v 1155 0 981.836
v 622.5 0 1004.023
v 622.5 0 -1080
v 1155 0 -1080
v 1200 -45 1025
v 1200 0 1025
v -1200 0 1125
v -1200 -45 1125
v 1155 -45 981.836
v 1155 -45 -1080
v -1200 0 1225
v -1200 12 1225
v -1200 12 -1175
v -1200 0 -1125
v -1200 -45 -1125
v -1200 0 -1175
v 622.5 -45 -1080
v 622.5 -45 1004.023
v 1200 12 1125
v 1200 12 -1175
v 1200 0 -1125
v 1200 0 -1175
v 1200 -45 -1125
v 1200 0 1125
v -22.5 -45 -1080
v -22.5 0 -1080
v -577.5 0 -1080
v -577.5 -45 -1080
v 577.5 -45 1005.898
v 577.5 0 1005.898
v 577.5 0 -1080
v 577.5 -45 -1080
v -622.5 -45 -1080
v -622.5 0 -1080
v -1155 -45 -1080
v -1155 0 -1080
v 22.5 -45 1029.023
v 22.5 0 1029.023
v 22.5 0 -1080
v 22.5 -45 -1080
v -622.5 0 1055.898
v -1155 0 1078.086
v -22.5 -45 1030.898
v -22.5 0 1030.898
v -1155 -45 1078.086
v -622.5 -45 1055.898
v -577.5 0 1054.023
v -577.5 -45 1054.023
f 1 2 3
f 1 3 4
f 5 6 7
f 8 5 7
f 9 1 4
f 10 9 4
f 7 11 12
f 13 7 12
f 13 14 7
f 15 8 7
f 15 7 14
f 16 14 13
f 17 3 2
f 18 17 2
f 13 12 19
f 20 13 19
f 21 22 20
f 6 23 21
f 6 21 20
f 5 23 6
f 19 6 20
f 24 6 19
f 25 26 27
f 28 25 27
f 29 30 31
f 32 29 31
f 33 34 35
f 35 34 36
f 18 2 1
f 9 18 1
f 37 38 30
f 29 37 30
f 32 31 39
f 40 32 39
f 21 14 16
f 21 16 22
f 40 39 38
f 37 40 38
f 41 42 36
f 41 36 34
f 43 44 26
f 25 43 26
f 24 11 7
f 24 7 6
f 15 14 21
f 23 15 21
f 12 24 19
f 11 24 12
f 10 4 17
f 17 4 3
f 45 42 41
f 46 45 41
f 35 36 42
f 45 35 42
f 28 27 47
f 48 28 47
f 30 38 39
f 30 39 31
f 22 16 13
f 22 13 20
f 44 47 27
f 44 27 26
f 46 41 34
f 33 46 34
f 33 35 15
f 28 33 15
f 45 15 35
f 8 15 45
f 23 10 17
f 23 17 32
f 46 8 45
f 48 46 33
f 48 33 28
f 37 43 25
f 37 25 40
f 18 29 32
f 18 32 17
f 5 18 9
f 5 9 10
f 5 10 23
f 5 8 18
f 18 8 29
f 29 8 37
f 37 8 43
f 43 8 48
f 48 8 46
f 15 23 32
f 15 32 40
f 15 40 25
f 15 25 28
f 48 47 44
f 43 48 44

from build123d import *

# Parameters (mm, degrees)
F1_DEPTH = 45
F0_W     = 2400
F0_H     = 50
F2_DEPTH = 12


with BuildPart() as f1:
    # F0 (on Front) → F1 (new body)
    with BuildSketch(Plane.XZ):
        Polygon((1155, 981.835954), (1200, 979.960954), (1200, 1025), (-1200, 1125), (-1200, 1079.960954), (-1155, 1078.085954), (-622.5, 1055.898454), (-577.5, 1054.023454), (-22.5, 1030.898454), (22.5, 1029.023454), (577.5, 1005.898454), (622.5, 1004.023454), align=None)
        Polygon((-1200, 1079.960954), (-1200, -1080), (-1155, -1080), (-1155, 1078.085954), align=None)
        Polygon((-622.5, 1055.898454), (-622.5, -1080), (-577.5, -1080), (-577.5, 1054.023454), align=None)
        Polygon((-22.5, -1080), (22.5, -1080), (22.5, 1029.023454), (-22.5, 1030.898454), align=None)
        Polygon((577.5, -1080), (622.5, -1080), (622.5, 1004.023454), (577.5, 1005.898454), align=None)
        Polygon((1155, -1080), (1200, -1080), (1200, 979.960954), (1155, 981.835954), align=None)
        Polygon((-1200, -1125), (1200, -1125), (1200, -1080), (1155, -1080), (622.5, -1080), (577.5, -1080), (22.5, -1080), (-22.5, -1080), (-577.5, -1080), (-622.5, -1080), (-1155, -1080), (-1200, -1080), align=None)
    extrude(amount=F1_DEPTH)

    # F0 (on Front) → F2 (join)
    with BuildSketch(Plane.XZ):
        Polygon((-1155, 1078.085954), (-1155, -1080), (-622.5, -1080), (-622.5, 1055.898454), align=None)
        Polygon((-577.5, 1054.023454), (-577.5, -1080), (-22.5, -1080), (-22.5, 1030.898454), align=None)
        Polygon((22.5, -1080), (577.5, -1080), (577.5, 1005.898454), (22.5, 1029.023454), align=None)
        Polygon((622.5, -1080), (1155, -1080), (1155, 981.835954), (622.5, 1004.023454), align=None)
        Polygon((-1200, 1125), (1200, 1025), (1200, 1125), (-1200, 1225), align=None)
        Polygon((1155, 981.835954), (1200, 979.960954), (1200, 1025), (-1200, 1125), (-1200, 1079.960954), (-1155, 1078.085954), (-622.5, 1055.898454), (-577.5, 1054.023454), (-22.5, 1030.898454), (22.5, 1029.023454), (577.5, 1005.898454), (622.5, 1004.023454), align=None)
        Polygon((-1200, 1079.960954), (-1200, -1080), (-1155, -1080), (-1155, 1078.085954), align=None)
        Polygon((-622.5, 1055.898454), (-622.5, -1080), (-577.5, -1080), (-577.5, 1054.023454), align=None)
        Polygon((-22.5, -1080), (22.5, -1080), (22.5, 1029.023454), (-22.5, 1030.898454), align=None)
        Polygon((577.5, -1080), (622.5, -1080), (622.5, 1004.023454), (577.5, 1005.898454), align=None)
        Polygon((1155, -1080), (1200, -1080), (1200, 979.960954), (1155, 981.835954), align=None)
        Polygon((-1200, -1125), (1200, -1125), (1200, -1080), (1155, -1080), (622.5, -1080), (577.5, -1080), (22.5, -1080), (-22.5, -1080), (-577.5, -1080), (-622.5, -1080), (-1155, -1080), (-1200, -1080), align=None)
        with Locations((0, -1150)):
            Rectangle(F0_W, F0_H)
    extrude(amount=-F2_DEPTH)


solid = f1.part
